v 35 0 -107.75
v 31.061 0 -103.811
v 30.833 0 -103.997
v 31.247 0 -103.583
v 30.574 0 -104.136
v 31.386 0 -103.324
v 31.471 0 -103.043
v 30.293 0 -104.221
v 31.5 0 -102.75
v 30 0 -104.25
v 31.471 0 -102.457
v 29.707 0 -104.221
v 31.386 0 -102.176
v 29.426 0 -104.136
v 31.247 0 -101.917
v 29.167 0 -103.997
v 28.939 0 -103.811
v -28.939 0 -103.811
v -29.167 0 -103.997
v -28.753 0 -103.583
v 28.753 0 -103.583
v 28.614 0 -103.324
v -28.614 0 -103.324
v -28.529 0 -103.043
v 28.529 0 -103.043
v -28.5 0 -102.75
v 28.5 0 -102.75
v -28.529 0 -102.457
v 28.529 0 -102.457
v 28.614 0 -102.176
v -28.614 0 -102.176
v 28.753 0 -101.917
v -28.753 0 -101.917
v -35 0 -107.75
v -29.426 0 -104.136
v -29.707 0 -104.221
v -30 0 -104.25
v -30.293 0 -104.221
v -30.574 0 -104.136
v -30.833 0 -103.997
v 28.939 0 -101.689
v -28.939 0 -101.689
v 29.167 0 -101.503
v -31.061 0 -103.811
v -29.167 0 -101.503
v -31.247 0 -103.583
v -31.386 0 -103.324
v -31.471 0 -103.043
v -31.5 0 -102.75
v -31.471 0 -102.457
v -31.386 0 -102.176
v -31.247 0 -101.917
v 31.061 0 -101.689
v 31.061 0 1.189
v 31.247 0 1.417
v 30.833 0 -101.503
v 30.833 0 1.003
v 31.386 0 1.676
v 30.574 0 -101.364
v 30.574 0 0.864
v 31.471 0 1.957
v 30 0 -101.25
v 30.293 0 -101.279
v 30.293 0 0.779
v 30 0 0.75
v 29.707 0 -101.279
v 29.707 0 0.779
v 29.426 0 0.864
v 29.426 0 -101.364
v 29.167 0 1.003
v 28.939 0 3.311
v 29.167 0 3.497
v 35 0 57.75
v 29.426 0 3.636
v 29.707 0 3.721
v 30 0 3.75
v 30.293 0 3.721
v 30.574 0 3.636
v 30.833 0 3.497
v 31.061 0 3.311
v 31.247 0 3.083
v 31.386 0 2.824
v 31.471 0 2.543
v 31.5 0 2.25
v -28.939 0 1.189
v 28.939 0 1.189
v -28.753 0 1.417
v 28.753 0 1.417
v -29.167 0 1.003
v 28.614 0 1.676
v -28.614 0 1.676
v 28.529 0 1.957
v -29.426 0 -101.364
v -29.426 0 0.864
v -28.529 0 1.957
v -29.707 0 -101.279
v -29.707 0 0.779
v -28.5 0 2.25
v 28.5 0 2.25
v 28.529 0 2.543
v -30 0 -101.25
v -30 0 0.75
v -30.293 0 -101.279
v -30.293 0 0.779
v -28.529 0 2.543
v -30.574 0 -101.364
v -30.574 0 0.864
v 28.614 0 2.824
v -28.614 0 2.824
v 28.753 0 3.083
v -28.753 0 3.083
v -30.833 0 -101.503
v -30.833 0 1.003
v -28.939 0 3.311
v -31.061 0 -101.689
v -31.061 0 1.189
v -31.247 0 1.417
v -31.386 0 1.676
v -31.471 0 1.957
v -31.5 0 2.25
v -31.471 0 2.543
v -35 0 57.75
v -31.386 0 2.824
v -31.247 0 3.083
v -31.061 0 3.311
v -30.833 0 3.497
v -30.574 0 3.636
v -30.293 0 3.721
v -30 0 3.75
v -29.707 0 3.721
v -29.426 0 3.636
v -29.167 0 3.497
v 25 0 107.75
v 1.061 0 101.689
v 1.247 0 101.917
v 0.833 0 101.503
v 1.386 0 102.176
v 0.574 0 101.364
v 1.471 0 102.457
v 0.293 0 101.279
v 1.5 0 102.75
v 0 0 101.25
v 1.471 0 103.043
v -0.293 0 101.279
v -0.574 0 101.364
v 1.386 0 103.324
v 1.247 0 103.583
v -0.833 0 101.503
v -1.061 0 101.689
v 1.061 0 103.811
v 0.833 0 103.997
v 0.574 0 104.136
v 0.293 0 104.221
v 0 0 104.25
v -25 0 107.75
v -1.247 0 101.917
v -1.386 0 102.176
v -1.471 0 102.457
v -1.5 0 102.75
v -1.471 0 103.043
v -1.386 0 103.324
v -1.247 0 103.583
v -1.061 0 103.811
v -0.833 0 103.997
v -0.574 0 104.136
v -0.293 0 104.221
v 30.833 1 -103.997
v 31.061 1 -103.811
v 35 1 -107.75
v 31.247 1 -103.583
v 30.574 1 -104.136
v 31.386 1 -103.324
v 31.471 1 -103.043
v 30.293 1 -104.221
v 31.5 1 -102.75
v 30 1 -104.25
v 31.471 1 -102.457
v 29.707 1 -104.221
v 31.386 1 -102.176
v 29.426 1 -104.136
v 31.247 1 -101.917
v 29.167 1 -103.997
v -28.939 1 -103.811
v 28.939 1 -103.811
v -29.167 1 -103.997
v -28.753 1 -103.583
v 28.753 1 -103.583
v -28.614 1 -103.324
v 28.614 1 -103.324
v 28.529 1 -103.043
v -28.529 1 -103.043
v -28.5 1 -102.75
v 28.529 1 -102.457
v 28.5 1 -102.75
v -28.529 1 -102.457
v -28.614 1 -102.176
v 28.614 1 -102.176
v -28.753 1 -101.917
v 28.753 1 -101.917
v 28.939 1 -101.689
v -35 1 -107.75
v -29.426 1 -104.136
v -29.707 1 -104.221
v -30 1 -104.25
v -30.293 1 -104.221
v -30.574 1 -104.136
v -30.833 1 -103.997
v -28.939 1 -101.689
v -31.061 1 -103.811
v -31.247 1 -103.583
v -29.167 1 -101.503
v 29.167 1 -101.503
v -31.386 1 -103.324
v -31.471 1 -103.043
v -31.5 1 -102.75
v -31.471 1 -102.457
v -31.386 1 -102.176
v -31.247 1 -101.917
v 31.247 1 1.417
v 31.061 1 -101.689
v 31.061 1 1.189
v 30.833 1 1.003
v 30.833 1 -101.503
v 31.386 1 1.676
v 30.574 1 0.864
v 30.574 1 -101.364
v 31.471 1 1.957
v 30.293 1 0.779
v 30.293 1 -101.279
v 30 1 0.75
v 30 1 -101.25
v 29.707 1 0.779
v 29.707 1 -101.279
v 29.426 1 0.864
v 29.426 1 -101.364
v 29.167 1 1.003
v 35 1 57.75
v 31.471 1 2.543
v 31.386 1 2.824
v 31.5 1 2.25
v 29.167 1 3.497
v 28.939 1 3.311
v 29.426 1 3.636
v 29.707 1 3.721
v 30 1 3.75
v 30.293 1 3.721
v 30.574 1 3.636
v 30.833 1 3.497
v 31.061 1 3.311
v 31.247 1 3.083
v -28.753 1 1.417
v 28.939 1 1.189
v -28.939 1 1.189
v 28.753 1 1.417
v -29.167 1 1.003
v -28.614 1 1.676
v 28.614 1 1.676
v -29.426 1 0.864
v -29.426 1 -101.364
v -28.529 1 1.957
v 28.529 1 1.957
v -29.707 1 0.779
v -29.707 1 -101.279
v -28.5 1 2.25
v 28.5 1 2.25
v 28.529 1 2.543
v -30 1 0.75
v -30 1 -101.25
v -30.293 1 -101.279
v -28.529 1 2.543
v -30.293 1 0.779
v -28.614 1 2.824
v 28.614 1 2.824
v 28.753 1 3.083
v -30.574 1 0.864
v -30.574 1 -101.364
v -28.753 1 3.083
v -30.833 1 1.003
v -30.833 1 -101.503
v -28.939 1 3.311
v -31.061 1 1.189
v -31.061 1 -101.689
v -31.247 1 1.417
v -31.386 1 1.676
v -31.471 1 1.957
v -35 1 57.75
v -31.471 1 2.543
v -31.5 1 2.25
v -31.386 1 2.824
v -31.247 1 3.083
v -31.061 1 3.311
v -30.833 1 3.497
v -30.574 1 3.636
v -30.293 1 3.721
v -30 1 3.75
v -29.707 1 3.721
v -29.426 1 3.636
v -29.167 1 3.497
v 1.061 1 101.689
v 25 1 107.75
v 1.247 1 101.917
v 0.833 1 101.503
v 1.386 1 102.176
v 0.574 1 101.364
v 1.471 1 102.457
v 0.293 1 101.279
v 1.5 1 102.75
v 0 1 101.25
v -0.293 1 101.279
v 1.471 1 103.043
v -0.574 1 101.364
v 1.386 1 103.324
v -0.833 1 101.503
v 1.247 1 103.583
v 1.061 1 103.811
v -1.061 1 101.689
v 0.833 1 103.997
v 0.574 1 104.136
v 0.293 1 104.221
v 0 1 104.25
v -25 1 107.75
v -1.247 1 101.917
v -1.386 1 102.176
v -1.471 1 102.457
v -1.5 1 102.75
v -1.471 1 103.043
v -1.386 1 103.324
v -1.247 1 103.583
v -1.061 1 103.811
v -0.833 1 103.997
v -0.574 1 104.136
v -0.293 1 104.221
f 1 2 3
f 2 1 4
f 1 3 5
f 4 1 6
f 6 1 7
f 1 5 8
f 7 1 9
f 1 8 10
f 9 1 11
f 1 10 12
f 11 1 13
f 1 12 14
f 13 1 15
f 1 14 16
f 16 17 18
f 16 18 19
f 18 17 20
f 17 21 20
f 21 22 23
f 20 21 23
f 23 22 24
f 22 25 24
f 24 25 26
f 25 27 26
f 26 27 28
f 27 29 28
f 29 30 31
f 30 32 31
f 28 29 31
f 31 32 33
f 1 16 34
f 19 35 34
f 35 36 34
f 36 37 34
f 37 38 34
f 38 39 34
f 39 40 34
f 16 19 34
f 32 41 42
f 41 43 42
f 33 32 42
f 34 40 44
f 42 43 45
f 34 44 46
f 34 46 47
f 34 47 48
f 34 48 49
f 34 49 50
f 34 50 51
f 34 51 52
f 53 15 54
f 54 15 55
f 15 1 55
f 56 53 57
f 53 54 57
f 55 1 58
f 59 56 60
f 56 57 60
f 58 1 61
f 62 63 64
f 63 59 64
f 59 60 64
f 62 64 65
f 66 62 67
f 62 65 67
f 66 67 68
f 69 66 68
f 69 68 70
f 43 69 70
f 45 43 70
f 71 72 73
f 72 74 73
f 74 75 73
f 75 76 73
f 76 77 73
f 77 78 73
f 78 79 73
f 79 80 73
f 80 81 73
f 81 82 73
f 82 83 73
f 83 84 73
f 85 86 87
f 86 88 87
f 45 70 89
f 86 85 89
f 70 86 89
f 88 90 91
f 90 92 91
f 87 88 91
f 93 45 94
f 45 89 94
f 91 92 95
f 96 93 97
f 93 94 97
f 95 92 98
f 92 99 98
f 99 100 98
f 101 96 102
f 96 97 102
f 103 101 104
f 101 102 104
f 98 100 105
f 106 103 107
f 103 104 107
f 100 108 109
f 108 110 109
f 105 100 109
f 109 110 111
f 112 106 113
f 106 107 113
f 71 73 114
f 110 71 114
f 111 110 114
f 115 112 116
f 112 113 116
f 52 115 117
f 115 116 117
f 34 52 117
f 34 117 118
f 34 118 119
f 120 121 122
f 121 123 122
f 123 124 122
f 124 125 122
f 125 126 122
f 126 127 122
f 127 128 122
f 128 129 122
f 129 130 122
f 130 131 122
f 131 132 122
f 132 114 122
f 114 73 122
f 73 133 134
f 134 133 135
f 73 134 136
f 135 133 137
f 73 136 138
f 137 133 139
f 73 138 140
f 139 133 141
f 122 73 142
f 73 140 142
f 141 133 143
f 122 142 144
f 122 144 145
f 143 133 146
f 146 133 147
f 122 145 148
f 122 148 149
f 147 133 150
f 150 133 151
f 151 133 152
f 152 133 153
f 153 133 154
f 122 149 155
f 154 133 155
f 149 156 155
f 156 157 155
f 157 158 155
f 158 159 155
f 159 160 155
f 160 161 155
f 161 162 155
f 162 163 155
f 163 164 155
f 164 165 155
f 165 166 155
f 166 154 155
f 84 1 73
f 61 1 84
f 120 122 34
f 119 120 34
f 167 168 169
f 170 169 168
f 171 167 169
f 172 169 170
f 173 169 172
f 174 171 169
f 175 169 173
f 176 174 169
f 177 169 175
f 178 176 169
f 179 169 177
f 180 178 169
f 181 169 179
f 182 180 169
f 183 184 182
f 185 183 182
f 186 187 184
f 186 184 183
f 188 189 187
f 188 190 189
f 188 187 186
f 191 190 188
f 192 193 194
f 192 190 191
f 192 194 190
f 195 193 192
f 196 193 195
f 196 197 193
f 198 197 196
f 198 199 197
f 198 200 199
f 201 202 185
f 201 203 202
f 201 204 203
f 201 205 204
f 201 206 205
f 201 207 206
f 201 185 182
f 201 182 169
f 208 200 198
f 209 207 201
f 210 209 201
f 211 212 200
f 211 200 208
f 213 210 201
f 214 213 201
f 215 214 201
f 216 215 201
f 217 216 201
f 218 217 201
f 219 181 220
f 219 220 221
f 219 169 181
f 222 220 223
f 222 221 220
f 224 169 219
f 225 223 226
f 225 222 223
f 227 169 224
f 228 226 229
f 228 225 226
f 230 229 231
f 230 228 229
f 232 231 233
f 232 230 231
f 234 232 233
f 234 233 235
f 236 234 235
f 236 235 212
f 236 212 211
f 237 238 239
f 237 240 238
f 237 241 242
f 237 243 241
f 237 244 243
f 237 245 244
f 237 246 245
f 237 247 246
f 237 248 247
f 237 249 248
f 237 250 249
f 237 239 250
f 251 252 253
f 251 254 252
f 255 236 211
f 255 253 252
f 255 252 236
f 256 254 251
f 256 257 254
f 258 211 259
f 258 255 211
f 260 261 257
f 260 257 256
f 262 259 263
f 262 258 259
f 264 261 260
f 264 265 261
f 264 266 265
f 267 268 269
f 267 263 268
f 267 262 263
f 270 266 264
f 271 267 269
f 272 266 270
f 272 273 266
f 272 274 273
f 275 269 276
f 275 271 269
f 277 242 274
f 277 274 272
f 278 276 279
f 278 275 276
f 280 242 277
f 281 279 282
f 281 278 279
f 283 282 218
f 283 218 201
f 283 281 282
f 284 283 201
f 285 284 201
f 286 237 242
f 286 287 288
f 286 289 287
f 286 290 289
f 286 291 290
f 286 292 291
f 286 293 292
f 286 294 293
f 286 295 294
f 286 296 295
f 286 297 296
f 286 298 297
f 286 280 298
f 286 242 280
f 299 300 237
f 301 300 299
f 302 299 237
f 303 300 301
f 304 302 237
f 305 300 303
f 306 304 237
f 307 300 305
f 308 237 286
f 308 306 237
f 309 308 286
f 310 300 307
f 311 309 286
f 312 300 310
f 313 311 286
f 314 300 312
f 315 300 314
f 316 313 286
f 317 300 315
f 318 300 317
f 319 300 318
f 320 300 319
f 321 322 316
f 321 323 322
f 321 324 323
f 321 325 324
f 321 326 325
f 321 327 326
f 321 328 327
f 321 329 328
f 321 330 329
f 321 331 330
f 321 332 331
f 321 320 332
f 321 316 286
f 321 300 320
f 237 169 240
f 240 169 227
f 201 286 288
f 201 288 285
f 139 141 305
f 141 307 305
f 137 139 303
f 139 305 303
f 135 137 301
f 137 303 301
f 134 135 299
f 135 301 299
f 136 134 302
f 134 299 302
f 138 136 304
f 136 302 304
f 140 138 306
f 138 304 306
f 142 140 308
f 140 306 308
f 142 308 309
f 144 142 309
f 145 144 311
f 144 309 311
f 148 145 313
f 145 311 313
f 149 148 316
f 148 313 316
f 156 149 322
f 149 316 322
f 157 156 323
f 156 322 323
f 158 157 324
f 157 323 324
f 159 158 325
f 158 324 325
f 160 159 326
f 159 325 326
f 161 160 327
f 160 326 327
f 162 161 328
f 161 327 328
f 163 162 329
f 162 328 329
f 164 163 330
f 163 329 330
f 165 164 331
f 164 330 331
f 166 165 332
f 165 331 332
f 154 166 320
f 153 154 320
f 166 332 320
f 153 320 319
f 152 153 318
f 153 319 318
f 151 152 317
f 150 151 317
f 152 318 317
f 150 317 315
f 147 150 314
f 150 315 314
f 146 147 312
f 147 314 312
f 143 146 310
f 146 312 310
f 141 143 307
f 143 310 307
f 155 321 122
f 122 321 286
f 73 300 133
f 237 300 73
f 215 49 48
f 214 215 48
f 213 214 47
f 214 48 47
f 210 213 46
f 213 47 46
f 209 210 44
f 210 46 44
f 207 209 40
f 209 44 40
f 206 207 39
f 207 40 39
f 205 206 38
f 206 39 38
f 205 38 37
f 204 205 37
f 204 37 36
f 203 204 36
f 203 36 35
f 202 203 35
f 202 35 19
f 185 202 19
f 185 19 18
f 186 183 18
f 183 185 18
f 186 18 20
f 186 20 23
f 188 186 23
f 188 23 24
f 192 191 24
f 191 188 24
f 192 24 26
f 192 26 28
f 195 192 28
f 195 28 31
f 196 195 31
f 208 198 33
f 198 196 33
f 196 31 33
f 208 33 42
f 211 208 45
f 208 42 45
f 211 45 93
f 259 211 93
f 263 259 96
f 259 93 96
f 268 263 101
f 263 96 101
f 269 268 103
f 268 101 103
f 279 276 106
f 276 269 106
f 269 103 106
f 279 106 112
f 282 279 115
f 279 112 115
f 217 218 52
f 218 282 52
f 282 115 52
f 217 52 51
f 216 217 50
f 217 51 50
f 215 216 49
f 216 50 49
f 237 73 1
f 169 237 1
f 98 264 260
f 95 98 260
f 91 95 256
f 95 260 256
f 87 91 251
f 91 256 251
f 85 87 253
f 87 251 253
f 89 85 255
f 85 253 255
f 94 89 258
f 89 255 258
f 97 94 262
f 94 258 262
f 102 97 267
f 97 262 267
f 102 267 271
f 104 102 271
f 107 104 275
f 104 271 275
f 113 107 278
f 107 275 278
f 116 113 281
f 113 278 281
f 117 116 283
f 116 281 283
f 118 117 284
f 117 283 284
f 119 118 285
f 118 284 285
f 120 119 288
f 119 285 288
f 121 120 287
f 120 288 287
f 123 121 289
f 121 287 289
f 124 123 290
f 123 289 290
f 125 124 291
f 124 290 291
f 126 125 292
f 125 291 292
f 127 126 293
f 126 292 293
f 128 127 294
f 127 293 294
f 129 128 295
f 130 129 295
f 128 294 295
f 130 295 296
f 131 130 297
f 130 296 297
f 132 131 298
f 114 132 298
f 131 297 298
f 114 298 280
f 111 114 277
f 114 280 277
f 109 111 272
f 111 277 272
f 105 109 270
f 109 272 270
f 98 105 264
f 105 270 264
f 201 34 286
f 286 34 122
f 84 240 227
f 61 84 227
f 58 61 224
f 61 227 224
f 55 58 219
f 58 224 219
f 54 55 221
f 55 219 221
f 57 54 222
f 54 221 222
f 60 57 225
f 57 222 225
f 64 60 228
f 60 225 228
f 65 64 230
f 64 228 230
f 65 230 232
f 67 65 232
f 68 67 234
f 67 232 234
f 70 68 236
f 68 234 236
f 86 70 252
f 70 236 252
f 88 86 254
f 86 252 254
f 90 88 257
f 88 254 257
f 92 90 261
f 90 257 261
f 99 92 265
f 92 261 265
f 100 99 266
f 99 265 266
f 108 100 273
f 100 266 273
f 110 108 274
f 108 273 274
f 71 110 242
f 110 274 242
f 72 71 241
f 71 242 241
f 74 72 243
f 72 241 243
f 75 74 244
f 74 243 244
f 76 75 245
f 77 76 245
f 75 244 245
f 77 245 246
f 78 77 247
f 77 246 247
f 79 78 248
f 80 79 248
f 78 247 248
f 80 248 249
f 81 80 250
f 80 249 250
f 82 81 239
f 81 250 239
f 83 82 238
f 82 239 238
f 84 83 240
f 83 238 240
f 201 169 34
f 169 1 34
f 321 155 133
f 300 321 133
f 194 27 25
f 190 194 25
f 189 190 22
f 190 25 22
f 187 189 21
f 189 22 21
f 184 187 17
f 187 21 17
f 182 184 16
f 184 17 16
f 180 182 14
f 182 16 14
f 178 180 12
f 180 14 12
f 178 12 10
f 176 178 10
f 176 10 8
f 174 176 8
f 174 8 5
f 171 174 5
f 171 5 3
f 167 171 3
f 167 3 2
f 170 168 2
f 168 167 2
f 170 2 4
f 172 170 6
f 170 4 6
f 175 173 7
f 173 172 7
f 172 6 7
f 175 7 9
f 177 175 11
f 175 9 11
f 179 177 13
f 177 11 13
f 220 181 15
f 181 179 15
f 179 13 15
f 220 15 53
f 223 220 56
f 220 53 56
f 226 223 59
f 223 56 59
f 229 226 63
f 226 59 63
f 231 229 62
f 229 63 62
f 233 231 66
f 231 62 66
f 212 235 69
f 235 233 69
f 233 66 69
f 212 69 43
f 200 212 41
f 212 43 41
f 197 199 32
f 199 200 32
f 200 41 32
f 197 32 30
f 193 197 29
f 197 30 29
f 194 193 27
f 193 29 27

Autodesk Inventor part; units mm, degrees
ref_plane "YZ Plane" through (0, 0, 0) normal (1, 0, 0) x (0, 1, 0)
ref_plane "XZ Plane" through (0, 0, 0) normal (0, 1, 0) x (-1, 0, 0)
ref_plane "XY Plane" through (0, 0, 0) normal (0, 0, 1) x (1, 0, 0)
sketch "Sketch1" plane through (0, 0, 0) normal (0, 1, 0) x (-1, 0, 0)
  line L0 (35, 107.75) -> (-35, 107.75)
  line L1 (-35, 107.75) -> (-35, -107.75)
  line L2 (-35, -107.75) -> (35, -107.75)
  line L3 (35, -107.75) -> (35, 107.75)
  line L4 (35, 107.75) -> (-35, -107.75) construction
  line L5 (-35, 107.75) -> (35, -107.75) construction
  circle A0 centre (30, -102.75) radius 1.5
  circle A1 centre (-30, -102.75) radius 1.5
  point P0 (0, 0)
  dimension "d0" = 70
  dimension "d1" = 215.5
  dimension "d2" = 3
  dimension "d3" = 3
  dimension "d4" = 5
  dimension "d5" = 5
  dimension "d6" = 5
  dimension "d7" = 5
extrude "Extrusion1" add sketch "Sketch1" along normal blind 1
sketch "Sketch2" plane through (0, 1, 0) normal (0, 1, 0) x (1, 0, 0)
  line L0 (-35, -107.75) -> (35, -107.75) projected
  line L1 (-35, -107.75) -> (-25, -107.75)
  line L2 (-25, -107.75) -> (-25, -57.75)
  line L3 (-25, -57.75) -> (-35, -57.75)
  line L4 (-35, -57.75) -> (-35, -107.75)
  line L5 (35, -107.75) -> (25, -107.75)
  line L6 (25, -107.75) -> (25, -57.75)
  line L7 (25, -57.75) -> (35, -57.75)
  line L8 (35, -57.75) -> (35, -107.75)
  line L9 (-25, -107.75) -> (-35, -57.75)
  line L10 (25, -107.75) -> (35, -57.75)
  point P0 (0, 0)
  dimension "d10" = 10
  dimension "d11" = 50
  dimension "d12" = 10
  dimension "d13" = 50
extrude "Extrusion2" cut sketch "Sketch2" against normal up to next contours L4 L9 L0 | L10 L8 L0
sketch "Sketch3" plane through (0, 1, 0) normal (0, 1, 0) x (1, 0, 0)
  circle A0 centre (-30, -2.25) radius 1.5
  circle A1 centre (30, -2.25) radius 1.5
  line L0 (-25, -107.75) -> (25, -107.75) projected
  line L1 (-35, 107.75) -> (-35, -57.75) projected
  line L2 (35, -57.75) -> (35, 107.75) projected
  circle A2 centre (0, -102.75) radius 1.5
  point P0 (0, 0)
  dimension "d16" = 3
  dimension "d17" = 3
  dimension "d18" = 105.5
  dimension "d19" = 105.5
  dimension "d20" = 5
  dimension "d21" = 5
  dimension "d22" = 3
  dimension "d23" = 5
extrude "Extrusion3" cut sketch "Sketch3" against normal up to next
properties part number "cover2" material "PET Plastic"
